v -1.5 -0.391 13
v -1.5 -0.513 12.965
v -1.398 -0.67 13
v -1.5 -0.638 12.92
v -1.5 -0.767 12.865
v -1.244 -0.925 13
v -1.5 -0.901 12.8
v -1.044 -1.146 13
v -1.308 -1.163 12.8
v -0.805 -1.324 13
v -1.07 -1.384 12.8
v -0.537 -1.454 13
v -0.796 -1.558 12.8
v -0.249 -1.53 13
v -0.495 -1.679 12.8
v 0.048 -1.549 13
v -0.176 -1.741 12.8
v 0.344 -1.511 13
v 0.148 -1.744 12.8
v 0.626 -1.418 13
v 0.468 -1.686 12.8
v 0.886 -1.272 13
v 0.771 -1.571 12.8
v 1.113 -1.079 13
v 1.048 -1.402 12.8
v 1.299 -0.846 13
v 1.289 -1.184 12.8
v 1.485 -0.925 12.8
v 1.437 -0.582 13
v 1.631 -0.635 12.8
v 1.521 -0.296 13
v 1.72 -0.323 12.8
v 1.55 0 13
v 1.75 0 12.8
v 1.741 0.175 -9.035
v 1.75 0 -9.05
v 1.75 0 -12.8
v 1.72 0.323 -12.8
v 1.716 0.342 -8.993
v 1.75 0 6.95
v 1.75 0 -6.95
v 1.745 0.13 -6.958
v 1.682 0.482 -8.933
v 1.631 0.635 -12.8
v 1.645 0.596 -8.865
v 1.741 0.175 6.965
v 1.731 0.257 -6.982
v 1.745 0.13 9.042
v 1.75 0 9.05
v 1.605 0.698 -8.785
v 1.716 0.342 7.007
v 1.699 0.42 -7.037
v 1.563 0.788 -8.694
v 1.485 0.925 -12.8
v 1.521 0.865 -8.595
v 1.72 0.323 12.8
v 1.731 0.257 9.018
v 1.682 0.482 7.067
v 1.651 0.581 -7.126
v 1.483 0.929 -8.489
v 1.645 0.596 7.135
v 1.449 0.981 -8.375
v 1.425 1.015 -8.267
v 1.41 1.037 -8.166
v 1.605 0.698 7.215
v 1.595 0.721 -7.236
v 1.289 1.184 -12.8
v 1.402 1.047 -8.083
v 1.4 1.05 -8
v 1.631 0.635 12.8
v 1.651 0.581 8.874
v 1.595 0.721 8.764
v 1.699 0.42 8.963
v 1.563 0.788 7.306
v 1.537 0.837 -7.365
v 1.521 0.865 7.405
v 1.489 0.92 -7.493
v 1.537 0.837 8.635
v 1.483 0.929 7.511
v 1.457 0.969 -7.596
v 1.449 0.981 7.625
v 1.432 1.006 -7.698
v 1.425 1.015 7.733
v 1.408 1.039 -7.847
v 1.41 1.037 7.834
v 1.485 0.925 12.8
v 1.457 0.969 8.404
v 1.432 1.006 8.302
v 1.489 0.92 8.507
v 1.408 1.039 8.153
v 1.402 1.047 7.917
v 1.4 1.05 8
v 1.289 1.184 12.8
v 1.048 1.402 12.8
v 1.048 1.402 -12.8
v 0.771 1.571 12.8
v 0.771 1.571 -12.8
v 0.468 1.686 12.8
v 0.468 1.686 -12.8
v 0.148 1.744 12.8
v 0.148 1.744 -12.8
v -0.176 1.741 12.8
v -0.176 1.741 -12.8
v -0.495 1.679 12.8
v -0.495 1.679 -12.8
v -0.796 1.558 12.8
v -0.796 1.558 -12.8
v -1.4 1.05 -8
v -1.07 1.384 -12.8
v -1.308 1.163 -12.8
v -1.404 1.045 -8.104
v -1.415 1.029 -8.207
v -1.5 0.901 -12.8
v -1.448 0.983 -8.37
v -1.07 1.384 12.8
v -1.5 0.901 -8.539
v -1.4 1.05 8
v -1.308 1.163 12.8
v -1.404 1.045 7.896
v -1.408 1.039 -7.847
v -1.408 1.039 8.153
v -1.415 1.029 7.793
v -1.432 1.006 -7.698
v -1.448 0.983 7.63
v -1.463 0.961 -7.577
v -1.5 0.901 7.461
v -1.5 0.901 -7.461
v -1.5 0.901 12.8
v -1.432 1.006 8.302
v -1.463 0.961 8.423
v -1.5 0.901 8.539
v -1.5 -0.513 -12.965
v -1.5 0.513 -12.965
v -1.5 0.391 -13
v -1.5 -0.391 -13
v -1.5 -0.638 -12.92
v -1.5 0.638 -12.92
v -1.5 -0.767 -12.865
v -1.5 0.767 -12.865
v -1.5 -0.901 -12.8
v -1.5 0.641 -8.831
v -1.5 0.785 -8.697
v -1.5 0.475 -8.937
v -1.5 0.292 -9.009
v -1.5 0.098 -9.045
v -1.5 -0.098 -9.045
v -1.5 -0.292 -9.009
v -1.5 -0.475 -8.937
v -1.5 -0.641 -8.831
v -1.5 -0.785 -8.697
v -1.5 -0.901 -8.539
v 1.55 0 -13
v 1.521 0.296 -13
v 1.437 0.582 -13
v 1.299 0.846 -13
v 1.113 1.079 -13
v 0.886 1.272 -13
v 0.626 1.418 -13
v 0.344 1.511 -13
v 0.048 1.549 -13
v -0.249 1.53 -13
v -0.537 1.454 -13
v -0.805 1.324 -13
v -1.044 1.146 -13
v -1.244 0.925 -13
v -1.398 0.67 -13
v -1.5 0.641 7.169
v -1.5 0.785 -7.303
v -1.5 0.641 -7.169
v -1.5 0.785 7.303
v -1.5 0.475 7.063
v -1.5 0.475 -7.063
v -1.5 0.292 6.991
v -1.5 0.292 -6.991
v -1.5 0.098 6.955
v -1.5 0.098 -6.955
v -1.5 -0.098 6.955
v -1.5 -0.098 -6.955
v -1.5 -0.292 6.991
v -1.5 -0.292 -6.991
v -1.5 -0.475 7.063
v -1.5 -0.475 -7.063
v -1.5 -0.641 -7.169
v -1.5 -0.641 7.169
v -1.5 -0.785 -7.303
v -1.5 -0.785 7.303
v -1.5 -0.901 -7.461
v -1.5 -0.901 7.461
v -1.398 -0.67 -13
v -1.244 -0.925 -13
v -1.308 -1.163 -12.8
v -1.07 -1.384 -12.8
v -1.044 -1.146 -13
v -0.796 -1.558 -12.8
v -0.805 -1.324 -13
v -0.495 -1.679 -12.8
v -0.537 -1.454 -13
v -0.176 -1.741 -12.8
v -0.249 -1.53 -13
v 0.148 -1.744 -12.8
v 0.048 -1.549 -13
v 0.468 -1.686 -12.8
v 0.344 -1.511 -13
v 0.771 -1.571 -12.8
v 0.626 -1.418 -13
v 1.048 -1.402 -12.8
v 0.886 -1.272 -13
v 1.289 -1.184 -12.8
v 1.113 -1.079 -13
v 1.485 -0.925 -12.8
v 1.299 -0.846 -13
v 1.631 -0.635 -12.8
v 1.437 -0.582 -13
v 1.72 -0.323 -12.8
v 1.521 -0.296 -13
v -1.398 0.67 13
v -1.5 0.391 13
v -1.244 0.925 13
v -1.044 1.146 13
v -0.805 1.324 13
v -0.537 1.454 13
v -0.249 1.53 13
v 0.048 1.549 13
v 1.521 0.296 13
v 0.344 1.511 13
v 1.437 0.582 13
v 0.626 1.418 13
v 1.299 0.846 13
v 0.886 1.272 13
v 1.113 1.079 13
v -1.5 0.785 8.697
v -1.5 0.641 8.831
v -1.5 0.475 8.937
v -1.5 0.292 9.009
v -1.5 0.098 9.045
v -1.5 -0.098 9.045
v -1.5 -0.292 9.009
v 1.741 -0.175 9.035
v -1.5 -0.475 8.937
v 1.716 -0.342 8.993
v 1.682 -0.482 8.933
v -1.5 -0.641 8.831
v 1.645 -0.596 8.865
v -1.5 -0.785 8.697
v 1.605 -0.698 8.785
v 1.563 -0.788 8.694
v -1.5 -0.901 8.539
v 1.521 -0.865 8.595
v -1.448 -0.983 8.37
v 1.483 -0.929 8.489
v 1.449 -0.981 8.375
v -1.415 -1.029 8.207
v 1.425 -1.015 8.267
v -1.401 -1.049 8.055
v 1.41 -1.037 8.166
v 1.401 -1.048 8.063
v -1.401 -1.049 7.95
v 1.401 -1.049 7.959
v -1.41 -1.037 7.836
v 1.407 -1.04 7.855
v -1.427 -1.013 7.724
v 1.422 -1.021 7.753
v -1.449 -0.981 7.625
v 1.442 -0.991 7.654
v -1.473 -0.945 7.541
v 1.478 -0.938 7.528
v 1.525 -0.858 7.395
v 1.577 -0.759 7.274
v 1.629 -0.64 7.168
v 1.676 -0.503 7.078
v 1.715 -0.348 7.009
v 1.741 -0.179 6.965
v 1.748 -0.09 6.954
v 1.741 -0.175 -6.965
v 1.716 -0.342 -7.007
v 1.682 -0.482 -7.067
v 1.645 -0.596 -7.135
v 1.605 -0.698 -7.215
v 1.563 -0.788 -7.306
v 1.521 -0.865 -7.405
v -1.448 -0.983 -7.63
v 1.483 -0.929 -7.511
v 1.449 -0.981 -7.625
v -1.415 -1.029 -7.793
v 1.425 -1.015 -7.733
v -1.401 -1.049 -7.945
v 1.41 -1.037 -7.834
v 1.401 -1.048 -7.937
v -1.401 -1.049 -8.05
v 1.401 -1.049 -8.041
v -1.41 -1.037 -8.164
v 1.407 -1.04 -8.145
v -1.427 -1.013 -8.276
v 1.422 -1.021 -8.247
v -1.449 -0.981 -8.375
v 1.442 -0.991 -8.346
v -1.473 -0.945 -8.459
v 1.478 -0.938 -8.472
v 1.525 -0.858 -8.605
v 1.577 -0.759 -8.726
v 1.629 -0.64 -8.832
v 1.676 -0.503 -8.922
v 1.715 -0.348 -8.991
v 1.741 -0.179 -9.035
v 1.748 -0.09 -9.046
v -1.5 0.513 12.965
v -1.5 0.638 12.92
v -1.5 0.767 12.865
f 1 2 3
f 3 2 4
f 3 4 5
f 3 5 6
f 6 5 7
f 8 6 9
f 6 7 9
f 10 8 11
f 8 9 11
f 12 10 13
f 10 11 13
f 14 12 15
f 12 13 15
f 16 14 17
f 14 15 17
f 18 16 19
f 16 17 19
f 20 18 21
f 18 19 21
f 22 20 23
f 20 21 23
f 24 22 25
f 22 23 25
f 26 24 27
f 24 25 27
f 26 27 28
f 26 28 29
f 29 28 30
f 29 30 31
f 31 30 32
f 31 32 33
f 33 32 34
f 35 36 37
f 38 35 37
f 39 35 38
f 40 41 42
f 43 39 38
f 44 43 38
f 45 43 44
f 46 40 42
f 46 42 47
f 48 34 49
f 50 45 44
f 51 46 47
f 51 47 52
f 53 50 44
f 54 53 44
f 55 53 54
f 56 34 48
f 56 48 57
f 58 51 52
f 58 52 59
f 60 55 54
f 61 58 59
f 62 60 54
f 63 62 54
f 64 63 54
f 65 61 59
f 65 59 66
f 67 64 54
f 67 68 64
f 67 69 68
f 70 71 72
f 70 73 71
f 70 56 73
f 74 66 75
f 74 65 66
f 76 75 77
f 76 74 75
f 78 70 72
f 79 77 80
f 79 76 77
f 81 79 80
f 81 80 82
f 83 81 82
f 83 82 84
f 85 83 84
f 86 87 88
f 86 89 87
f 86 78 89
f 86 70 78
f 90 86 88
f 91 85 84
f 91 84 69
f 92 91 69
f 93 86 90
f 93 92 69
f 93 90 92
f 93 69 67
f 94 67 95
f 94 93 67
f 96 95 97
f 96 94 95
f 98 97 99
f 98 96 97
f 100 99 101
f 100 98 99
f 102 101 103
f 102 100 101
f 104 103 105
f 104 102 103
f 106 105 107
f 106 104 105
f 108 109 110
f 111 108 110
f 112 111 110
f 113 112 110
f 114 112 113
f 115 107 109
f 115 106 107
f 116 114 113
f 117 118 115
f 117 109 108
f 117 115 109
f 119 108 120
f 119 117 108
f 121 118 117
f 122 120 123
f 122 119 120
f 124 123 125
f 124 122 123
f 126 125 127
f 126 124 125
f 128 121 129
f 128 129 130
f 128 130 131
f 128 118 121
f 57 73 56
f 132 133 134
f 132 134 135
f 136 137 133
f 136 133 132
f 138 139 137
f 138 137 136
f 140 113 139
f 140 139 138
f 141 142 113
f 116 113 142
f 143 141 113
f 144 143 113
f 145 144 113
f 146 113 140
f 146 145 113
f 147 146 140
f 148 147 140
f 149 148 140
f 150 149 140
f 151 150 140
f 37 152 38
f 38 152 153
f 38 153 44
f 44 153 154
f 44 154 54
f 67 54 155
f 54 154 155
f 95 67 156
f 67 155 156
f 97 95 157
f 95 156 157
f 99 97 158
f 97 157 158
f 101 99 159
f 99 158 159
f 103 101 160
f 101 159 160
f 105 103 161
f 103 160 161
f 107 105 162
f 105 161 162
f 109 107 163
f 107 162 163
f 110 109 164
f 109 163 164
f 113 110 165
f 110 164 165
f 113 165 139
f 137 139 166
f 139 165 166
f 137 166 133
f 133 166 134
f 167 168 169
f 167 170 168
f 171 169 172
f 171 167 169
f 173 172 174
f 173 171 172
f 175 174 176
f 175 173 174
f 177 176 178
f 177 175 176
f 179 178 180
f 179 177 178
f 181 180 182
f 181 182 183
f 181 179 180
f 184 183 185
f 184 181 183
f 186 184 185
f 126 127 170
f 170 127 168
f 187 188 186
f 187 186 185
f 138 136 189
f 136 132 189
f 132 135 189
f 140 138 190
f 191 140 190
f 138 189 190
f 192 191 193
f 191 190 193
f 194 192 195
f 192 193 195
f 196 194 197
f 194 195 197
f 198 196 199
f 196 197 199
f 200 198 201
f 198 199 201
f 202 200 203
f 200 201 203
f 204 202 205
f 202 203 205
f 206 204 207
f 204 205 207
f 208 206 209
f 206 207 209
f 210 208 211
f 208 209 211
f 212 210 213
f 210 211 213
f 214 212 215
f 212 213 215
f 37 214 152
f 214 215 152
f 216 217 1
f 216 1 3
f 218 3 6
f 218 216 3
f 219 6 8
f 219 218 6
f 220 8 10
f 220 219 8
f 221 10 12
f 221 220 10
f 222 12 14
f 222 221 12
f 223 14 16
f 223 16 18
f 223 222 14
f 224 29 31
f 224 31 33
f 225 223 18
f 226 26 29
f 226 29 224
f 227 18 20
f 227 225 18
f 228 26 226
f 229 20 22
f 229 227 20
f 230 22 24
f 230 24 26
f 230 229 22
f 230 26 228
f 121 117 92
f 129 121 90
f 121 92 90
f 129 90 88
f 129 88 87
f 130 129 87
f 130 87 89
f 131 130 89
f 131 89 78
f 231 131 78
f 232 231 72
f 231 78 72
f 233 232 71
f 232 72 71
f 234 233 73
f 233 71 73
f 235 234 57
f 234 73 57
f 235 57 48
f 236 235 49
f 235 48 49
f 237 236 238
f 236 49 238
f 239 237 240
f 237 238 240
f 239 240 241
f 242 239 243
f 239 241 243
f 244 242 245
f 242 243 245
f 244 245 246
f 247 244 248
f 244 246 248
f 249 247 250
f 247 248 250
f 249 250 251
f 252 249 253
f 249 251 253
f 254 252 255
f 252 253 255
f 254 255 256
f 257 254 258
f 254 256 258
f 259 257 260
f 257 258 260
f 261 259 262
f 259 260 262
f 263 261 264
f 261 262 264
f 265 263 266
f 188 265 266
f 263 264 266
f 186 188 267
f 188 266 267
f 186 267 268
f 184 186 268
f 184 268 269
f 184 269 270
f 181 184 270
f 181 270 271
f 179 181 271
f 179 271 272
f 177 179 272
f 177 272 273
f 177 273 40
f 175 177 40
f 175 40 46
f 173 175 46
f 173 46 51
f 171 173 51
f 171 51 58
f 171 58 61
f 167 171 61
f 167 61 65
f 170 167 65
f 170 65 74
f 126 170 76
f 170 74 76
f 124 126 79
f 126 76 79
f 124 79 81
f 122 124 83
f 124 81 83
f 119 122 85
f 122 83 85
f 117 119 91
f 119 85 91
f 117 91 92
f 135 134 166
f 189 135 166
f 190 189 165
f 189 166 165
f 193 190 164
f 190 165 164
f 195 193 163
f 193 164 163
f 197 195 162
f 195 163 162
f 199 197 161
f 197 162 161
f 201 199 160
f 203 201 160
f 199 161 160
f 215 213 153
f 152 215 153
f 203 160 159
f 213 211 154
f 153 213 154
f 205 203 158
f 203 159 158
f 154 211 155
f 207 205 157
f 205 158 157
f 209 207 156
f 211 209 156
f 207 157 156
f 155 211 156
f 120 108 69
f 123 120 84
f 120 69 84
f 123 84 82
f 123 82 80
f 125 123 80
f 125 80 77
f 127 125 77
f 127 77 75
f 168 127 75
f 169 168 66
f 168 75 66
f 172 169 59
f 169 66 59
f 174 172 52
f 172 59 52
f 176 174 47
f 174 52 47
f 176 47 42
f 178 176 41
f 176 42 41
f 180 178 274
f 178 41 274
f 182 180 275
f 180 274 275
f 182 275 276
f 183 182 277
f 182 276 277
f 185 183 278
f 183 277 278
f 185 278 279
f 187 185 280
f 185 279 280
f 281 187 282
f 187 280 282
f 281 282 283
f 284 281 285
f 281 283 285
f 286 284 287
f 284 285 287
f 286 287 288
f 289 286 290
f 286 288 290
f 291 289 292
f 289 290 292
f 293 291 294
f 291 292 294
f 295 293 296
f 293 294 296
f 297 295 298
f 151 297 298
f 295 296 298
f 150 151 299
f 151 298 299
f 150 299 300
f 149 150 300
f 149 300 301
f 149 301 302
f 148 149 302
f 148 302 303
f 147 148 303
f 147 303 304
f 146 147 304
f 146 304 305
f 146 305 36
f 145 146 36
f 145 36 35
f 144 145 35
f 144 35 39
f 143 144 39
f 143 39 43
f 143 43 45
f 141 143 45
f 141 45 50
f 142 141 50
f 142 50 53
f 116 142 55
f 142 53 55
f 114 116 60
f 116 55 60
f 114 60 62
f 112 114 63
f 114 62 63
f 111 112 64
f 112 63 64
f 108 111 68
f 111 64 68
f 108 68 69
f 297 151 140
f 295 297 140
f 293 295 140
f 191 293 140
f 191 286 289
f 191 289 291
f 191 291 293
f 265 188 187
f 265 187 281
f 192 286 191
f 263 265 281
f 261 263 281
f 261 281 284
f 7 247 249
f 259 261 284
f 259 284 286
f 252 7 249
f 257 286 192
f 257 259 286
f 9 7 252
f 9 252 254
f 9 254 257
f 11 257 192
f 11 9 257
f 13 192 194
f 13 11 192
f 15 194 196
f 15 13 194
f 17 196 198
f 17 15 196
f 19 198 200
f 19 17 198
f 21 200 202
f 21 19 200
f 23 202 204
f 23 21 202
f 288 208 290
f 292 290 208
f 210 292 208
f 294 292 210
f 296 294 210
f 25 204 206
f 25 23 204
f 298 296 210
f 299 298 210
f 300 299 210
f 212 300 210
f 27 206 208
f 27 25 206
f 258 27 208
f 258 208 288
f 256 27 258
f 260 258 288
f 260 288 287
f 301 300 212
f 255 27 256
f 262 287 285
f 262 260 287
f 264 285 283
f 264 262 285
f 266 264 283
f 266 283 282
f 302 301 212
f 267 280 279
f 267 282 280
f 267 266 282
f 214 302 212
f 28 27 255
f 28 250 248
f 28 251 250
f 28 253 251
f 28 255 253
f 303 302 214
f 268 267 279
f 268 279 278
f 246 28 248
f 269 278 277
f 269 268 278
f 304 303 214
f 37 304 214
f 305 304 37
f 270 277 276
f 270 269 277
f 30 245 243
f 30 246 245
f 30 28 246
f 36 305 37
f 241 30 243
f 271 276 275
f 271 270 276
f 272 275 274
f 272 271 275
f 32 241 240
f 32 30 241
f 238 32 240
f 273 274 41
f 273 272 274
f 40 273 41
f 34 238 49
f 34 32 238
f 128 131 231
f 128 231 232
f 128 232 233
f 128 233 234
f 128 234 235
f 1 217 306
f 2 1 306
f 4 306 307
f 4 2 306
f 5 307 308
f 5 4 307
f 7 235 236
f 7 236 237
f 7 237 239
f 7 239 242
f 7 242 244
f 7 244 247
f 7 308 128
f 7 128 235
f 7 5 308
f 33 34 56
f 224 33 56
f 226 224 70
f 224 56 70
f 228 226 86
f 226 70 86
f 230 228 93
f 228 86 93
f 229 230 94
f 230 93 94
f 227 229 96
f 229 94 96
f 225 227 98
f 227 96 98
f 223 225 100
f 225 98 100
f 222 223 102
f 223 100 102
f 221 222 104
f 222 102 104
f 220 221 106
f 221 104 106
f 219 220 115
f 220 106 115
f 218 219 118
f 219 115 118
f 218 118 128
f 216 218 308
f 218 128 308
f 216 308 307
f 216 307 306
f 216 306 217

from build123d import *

# Parameters (mm, degrees)
F1_DEPTH = 13
F2_SIZE  = 0.2
F4_D     = 2.1


with BuildPart() as f1:
    # F0 (on Top) → F1 (new body, symmetric)
    with BuildSketch(Plane.XY):
        with BuildLine():
            ThreePointArc((-1.5, -0.901388), (0.467707, -1.686342), (1.75, 0))
            ThreePointArc((1.75, 0), (0.467707, 1.686342), (-1.5, 0.901388))
            Line((-1.5, 0.901388), (-1.5, -0.901388))
        make_face()
    extrude(amount=F1_DEPTH, both=True)

    # F2
    f2_edges = [f1.edges().sort_by_distance(p)[0] for p in [
        (0.467707, 1.686342, 13),
        (0.467707, -1.686342, 13),
        (0.467707, 1.686342, -13),
        (0.467707, -1.686342, -13),
    ]]
    chamfer(f2_edges, length=F2_SIZE)

    # F4 (through all)
    with Locations(Plane(origin=(-1.5, 0, 0), x_dir=(0, -1, 0), z_dir=(-1, 0, 0))):
        with Locations((0, 8), (0, -8)):
            Hole(F4_D / 2)


solid = f1.part
